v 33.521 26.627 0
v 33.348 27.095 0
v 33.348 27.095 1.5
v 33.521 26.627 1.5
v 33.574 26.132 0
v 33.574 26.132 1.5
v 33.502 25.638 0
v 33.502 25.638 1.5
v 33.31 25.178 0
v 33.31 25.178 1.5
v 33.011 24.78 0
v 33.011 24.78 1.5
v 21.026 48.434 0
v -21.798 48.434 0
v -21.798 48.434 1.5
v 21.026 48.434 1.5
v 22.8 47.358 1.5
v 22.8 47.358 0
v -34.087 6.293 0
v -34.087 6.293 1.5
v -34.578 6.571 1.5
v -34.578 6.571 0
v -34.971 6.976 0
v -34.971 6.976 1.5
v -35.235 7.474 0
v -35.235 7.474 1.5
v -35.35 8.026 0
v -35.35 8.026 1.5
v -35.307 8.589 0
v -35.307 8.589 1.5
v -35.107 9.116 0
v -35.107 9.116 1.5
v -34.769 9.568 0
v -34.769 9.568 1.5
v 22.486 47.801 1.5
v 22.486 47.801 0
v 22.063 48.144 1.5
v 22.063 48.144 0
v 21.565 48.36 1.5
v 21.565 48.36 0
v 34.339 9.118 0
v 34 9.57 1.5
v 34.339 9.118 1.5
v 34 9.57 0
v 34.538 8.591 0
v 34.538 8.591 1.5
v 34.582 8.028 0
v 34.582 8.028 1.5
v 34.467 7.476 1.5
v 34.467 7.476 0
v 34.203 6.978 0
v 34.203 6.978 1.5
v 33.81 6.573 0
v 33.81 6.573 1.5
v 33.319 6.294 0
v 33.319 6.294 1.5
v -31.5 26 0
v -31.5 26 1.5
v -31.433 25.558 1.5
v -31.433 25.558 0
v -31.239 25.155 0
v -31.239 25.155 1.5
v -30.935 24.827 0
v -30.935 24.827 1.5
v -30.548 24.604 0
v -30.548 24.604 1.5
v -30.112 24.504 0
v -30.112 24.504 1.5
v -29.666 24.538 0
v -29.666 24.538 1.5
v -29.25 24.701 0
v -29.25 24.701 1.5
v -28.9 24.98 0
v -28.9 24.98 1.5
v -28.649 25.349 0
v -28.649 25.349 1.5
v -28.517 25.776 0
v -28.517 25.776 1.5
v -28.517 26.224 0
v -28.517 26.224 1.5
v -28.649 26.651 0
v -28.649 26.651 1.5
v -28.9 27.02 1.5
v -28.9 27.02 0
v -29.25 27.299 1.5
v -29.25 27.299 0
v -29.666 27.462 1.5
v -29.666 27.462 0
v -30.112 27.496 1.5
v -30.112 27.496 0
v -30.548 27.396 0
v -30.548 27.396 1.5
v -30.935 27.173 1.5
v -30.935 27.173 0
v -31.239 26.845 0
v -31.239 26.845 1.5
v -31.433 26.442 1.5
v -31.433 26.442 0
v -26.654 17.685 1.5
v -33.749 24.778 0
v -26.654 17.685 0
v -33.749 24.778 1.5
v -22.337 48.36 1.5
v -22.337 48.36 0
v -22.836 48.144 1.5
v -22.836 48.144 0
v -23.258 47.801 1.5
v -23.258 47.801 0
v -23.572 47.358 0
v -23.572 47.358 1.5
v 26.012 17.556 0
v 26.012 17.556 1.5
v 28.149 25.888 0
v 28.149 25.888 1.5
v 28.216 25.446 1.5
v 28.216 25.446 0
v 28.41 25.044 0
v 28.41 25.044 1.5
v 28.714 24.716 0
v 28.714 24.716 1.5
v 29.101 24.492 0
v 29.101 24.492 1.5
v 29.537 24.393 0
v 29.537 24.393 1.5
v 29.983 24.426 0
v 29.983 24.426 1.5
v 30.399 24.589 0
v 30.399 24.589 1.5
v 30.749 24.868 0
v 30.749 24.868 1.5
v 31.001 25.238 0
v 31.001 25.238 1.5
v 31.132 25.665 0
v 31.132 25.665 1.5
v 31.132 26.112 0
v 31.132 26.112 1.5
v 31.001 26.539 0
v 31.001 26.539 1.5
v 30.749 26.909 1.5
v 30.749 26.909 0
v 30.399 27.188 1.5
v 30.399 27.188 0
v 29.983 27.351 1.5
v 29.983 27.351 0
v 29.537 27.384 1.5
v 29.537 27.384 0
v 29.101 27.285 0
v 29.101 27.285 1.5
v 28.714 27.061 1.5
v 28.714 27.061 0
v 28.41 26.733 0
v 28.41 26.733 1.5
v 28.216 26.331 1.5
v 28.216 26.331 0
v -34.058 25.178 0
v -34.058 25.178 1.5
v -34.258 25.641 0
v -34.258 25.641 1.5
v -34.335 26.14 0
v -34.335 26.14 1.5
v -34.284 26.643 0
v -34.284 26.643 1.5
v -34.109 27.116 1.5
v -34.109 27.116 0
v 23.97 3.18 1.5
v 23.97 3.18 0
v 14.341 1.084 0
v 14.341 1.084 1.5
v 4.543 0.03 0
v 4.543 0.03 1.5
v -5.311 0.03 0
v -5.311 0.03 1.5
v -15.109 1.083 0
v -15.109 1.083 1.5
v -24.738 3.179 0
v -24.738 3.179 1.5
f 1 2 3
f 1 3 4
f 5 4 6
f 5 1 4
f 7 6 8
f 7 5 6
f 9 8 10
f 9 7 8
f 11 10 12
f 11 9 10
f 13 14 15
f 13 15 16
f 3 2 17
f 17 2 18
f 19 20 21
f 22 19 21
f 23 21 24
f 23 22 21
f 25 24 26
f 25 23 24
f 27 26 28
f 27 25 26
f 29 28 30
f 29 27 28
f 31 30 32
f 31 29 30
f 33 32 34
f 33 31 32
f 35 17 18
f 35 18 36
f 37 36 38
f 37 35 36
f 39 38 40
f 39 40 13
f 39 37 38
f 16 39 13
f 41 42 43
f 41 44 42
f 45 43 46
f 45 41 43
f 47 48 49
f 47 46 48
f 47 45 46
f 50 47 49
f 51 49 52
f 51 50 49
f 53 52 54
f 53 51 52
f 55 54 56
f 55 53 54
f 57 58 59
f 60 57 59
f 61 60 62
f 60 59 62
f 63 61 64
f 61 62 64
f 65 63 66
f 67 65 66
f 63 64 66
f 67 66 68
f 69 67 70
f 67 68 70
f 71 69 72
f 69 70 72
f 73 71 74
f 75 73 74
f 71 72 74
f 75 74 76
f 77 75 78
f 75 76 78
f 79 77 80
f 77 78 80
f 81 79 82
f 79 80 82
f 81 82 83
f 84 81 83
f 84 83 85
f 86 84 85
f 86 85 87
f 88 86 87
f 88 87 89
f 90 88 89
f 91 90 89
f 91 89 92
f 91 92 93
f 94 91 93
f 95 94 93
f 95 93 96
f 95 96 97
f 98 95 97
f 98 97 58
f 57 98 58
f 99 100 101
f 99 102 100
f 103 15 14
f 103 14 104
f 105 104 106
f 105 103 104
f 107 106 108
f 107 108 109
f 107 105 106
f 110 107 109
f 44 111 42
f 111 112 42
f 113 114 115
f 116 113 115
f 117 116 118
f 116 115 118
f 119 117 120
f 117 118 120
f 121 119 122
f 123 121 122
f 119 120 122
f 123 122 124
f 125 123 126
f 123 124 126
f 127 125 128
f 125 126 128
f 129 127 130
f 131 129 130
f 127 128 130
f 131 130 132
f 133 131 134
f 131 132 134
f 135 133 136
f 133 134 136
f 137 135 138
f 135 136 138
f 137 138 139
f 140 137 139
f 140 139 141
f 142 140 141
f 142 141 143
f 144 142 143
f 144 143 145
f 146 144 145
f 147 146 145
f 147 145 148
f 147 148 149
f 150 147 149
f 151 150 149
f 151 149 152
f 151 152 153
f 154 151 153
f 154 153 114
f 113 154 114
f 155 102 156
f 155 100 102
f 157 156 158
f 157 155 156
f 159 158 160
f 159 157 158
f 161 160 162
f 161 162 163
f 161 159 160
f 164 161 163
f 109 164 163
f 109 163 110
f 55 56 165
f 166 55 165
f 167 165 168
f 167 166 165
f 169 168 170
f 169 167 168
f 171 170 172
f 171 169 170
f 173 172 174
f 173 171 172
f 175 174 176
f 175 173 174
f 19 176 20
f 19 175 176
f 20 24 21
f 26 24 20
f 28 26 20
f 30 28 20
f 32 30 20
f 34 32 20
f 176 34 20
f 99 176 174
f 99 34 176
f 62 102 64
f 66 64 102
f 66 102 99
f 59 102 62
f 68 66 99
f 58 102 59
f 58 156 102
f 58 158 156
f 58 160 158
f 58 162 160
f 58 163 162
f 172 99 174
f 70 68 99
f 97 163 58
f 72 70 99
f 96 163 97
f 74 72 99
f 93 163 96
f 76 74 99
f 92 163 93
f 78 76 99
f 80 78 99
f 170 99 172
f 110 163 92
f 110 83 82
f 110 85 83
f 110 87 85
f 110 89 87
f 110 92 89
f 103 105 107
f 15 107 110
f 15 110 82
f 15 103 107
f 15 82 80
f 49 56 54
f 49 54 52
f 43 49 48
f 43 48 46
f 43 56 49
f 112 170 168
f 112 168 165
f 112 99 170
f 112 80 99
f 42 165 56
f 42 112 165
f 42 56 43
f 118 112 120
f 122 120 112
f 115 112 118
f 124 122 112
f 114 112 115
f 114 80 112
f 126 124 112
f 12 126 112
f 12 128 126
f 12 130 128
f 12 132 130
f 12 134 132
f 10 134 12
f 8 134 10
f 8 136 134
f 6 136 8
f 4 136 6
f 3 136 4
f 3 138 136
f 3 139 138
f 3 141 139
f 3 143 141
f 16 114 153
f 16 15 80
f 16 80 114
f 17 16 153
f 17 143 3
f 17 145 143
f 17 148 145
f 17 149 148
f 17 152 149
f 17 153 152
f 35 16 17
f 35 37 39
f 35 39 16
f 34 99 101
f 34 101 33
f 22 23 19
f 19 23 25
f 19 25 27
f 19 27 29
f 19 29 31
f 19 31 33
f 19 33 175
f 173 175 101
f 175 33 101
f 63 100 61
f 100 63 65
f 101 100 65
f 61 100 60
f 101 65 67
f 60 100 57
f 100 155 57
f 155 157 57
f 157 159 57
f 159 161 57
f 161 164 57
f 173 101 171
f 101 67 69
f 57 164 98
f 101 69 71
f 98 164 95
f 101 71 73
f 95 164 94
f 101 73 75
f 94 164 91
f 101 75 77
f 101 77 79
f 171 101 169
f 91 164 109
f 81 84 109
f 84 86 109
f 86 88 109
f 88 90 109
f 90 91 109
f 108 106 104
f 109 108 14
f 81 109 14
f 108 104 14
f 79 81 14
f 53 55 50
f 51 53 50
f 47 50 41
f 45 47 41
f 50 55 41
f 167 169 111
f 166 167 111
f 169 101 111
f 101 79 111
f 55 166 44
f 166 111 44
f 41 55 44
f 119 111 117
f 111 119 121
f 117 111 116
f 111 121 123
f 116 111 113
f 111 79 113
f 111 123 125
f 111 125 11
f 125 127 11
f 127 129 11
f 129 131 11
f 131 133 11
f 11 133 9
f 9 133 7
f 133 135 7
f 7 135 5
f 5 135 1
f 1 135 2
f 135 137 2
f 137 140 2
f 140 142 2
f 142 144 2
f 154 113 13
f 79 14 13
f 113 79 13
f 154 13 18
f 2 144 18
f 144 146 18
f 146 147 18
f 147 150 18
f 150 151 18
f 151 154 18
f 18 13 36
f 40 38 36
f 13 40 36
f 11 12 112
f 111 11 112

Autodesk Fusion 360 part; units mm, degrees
sketch "スケッチ1" plane through (0, 0, 0) normal (0, 0, 1) x (1, 0, 0)
  arc A0 (-42.8671, 10.2928) -> (42.0947, 10.2928) centre (-0.3862, 91.8977) ccw
  line L0 (-0.3862, 91.8977) -> (-42.8671, 10.2928) construction
  line L1 (-0.3862, 91.8977) -> (42.0947, 10.2928) construction
  line L2 (-42.8671, 10.2928) -> (-23.0119, 48.4342)
  line L3 (42.0947, 10.2928) -> (22.2395, 48.4342)
  line L4 (-23.0119, 48.4342) -> (22.2395, 48.4342)
  dimension "d1" = 92
  dimension "d2" = 55
  dimension "d3" = 43
  dimension "d4" = 43
extrude "押し出し1" add sketch "スケッチ1" along normal blind 1.5
sketch "スケッチ2" plane through (0, 0, 1.5) normal (0, 0, 1) x (-1, 0, 0)
  arc A0 (42.8671, -10.2928) -> (-42.0947, -10.2928) centre (0.3862, -91.8977) ccw
  line L0 (-42.0947, -10.2928) -> (-22.2395, -48.4342)
  line L1 (-22.2395, -48.4342) -> (23.0119, -48.4342)
  line L2 (23.0119, -48.4342) -> (42.8671, -10.2928)
  line L3 (42.8671, -10.2928) -> (34.7865, -25.8154)
  line L4 (-42.0947, -10.2928) -> (-34.0141, -25.8154)
  line L5 (34.7865, -25.8154) -> (26.6537, -17.6847)
  line L6 (26.6537, -17.6847) -> (36.8874, -7.4486)
  line L7 (36.8874, -7.4486) -> (42.8671, -10.2928)
  line L8 (34.7865, -25.8154) -> (42.8671, -10.2928)
  line L9 (-34.0141, -25.8154) -> (-26.0125, -17.5556)
  line L10 (-26.0125, -17.5556) -> (-36.1199, -7.4507)
  line L11 (-36.1199, -7.4507) -> (-42.0947, -10.2928)
  dimension "d7" = 17.5
  dimension "d8" = 17.5
  dimension "d9" = 11.5
  dimension "d10" = 11.5
extrude "押し出し2" cut sketch "スケッチ2" against normal blind 1.5 contours L2 L3 L5 L6 L7 L8
extrude "押し出し3" cut sketch "スケッチ2" against normal blind 1.5 contours L0 L4 L9 L10 L11
sketch "スケッチ3" plane through (0, 0, 1.5) normal (0, 0, 1) x (-1, 0, 0)
  line L0 (-36.1199, -7.4507) -> (-26.0125, -17.5556)
  line L1 (-26.0125, -17.5556) -> (-34.0141, -25.8154)
  line L2 (-34.0141, -25.8154) -> (-22.2395, -48.4342)
  line L3 (-22.2395, -48.4342) -> (23.0119, -48.4342)
  line L4 (23.0119, -48.4342) -> (34.7865, -25.8154)
  line L5 (34.7865, -25.8154) -> (26.6537, -17.6847)
  line L6 (26.6537, -17.6847) -> (36.8874, -7.4486)
  arc A0 (36.8874, -7.4486) -> (-36.1199, -7.4507) centre (0.3862, -91.8977) ccw
  line L7 (45.6832, -13.5395) -> (36.8874, -13.5395)
  line L8 (36.8874, -13.5395) -> (36.8874, -7.4486)
  line L9 (36.8874, -7.4486) -> (45.6832, -7.4486)
  line L10 (45.6832, -7.4486) -> (45.6832, -13.5395)
  line L11 (-36.1199, -7.4507) -> (-43.0096, -7.4507)
  line L12 (-43.0096, -7.4507) -> (-43.0096, -10.616)
  line L13 (-43.0096, -10.616) -> (-36.1199, -10.616)
  line L14 (-36.1199, -10.616) -> (-36.1199, -7.4507)
extrude "押し出し4" cut sketch "スケッチ3" against normal blind 1.5 contours L7 L8 L9 L10
extrude "押し出し5" cut sketch "スケッチ3" against normal blind 1.5 contours L11 L12 L13 L14
fillet "フィレット1" radius 2 1 edges at (-36.8874, 7.4486, 0.75)
fillet "フィレット2" radius 2 1 edges at (-34.7865, 25.8154, 0.75)
fillet "フィレット3" radius 2 1 edges at (36.1199, 7.4507, 0.75)
fillet "フィレット4" radius 2 1 edges at (22.2395, 48.4342, 0.75)
fillet "フィレット5" radius 2 1 edges at (-23.0119, 48.4342, 0.75)
fillet "フィレット6" radius 2 1 edges at (34.0141, 25.8154, 0.75)
sketch "スケッチ4" plane through (0, 0, 1.5) normal (0, 0, 1) x (-1, 0, 0)
  arc A0 (-33.0106, -24.7796) -> (-33.3482, -27.0947) centre (-31.5741, -26.1712) ccw
  line L0 (-33.3482, -27.0947) -> (-22.7999, -47.3577)
  arc A1 (-22.7999, -47.3577) -> (-21.0259, -48.4342) centre (-21.0259, -46.4342) ccw
  line L1 (-21.0259, -48.4342) -> (21.7982, -48.4342)
  arc A2 (21.7982, -48.4342) -> (23.5723, -47.3577) centre (21.7982, -46.4342) ccw
  line L2 (23.5723, -47.3577) -> (34.1092, -27.1164)
  arc A3 (34.1092, -27.1164) -> (33.7492, -24.7785) centre (32.3352, -26.1929) ccw
  line L3 (33.7492, -24.7785) -> (26.6537, -17.6847)
  line L4 (26.6537, -17.6847) -> (34.7689, -9.5676)
  arc A4 (34.7689, -9.5676) -> (34.0871, -6.2926) centre (33.3545, -8.1536) ccw
  arc A5 (34.0871, -6.2926) -> (-33.3191, -6.2943) centre (0.3862, -91.8977) ccw
  arc A6 (-33.3191, -6.2943) -> (-34.0004, -9.5696) centre (-32.5864, -8.1552) ccw
  line L5 (-34.0004, -9.5696) -> (-26.0125, -17.5556)
  line L6 (-26.0125, -17.5556) -> (-33.0106, -24.7796)
  circle A7 centre (30, -26) radius 1.5
  circle A8 centre (-29.6492, -25.8885) radius 1.5
  dimension "d31" = 3
  dimension "d32" = 3
extrude "押し出し6" cut sketch "スケッチ4" against normal blind 2 contours A8
extrude "押し出し7" cut sketch "スケッチ4" against normal blind 2 contours A7
